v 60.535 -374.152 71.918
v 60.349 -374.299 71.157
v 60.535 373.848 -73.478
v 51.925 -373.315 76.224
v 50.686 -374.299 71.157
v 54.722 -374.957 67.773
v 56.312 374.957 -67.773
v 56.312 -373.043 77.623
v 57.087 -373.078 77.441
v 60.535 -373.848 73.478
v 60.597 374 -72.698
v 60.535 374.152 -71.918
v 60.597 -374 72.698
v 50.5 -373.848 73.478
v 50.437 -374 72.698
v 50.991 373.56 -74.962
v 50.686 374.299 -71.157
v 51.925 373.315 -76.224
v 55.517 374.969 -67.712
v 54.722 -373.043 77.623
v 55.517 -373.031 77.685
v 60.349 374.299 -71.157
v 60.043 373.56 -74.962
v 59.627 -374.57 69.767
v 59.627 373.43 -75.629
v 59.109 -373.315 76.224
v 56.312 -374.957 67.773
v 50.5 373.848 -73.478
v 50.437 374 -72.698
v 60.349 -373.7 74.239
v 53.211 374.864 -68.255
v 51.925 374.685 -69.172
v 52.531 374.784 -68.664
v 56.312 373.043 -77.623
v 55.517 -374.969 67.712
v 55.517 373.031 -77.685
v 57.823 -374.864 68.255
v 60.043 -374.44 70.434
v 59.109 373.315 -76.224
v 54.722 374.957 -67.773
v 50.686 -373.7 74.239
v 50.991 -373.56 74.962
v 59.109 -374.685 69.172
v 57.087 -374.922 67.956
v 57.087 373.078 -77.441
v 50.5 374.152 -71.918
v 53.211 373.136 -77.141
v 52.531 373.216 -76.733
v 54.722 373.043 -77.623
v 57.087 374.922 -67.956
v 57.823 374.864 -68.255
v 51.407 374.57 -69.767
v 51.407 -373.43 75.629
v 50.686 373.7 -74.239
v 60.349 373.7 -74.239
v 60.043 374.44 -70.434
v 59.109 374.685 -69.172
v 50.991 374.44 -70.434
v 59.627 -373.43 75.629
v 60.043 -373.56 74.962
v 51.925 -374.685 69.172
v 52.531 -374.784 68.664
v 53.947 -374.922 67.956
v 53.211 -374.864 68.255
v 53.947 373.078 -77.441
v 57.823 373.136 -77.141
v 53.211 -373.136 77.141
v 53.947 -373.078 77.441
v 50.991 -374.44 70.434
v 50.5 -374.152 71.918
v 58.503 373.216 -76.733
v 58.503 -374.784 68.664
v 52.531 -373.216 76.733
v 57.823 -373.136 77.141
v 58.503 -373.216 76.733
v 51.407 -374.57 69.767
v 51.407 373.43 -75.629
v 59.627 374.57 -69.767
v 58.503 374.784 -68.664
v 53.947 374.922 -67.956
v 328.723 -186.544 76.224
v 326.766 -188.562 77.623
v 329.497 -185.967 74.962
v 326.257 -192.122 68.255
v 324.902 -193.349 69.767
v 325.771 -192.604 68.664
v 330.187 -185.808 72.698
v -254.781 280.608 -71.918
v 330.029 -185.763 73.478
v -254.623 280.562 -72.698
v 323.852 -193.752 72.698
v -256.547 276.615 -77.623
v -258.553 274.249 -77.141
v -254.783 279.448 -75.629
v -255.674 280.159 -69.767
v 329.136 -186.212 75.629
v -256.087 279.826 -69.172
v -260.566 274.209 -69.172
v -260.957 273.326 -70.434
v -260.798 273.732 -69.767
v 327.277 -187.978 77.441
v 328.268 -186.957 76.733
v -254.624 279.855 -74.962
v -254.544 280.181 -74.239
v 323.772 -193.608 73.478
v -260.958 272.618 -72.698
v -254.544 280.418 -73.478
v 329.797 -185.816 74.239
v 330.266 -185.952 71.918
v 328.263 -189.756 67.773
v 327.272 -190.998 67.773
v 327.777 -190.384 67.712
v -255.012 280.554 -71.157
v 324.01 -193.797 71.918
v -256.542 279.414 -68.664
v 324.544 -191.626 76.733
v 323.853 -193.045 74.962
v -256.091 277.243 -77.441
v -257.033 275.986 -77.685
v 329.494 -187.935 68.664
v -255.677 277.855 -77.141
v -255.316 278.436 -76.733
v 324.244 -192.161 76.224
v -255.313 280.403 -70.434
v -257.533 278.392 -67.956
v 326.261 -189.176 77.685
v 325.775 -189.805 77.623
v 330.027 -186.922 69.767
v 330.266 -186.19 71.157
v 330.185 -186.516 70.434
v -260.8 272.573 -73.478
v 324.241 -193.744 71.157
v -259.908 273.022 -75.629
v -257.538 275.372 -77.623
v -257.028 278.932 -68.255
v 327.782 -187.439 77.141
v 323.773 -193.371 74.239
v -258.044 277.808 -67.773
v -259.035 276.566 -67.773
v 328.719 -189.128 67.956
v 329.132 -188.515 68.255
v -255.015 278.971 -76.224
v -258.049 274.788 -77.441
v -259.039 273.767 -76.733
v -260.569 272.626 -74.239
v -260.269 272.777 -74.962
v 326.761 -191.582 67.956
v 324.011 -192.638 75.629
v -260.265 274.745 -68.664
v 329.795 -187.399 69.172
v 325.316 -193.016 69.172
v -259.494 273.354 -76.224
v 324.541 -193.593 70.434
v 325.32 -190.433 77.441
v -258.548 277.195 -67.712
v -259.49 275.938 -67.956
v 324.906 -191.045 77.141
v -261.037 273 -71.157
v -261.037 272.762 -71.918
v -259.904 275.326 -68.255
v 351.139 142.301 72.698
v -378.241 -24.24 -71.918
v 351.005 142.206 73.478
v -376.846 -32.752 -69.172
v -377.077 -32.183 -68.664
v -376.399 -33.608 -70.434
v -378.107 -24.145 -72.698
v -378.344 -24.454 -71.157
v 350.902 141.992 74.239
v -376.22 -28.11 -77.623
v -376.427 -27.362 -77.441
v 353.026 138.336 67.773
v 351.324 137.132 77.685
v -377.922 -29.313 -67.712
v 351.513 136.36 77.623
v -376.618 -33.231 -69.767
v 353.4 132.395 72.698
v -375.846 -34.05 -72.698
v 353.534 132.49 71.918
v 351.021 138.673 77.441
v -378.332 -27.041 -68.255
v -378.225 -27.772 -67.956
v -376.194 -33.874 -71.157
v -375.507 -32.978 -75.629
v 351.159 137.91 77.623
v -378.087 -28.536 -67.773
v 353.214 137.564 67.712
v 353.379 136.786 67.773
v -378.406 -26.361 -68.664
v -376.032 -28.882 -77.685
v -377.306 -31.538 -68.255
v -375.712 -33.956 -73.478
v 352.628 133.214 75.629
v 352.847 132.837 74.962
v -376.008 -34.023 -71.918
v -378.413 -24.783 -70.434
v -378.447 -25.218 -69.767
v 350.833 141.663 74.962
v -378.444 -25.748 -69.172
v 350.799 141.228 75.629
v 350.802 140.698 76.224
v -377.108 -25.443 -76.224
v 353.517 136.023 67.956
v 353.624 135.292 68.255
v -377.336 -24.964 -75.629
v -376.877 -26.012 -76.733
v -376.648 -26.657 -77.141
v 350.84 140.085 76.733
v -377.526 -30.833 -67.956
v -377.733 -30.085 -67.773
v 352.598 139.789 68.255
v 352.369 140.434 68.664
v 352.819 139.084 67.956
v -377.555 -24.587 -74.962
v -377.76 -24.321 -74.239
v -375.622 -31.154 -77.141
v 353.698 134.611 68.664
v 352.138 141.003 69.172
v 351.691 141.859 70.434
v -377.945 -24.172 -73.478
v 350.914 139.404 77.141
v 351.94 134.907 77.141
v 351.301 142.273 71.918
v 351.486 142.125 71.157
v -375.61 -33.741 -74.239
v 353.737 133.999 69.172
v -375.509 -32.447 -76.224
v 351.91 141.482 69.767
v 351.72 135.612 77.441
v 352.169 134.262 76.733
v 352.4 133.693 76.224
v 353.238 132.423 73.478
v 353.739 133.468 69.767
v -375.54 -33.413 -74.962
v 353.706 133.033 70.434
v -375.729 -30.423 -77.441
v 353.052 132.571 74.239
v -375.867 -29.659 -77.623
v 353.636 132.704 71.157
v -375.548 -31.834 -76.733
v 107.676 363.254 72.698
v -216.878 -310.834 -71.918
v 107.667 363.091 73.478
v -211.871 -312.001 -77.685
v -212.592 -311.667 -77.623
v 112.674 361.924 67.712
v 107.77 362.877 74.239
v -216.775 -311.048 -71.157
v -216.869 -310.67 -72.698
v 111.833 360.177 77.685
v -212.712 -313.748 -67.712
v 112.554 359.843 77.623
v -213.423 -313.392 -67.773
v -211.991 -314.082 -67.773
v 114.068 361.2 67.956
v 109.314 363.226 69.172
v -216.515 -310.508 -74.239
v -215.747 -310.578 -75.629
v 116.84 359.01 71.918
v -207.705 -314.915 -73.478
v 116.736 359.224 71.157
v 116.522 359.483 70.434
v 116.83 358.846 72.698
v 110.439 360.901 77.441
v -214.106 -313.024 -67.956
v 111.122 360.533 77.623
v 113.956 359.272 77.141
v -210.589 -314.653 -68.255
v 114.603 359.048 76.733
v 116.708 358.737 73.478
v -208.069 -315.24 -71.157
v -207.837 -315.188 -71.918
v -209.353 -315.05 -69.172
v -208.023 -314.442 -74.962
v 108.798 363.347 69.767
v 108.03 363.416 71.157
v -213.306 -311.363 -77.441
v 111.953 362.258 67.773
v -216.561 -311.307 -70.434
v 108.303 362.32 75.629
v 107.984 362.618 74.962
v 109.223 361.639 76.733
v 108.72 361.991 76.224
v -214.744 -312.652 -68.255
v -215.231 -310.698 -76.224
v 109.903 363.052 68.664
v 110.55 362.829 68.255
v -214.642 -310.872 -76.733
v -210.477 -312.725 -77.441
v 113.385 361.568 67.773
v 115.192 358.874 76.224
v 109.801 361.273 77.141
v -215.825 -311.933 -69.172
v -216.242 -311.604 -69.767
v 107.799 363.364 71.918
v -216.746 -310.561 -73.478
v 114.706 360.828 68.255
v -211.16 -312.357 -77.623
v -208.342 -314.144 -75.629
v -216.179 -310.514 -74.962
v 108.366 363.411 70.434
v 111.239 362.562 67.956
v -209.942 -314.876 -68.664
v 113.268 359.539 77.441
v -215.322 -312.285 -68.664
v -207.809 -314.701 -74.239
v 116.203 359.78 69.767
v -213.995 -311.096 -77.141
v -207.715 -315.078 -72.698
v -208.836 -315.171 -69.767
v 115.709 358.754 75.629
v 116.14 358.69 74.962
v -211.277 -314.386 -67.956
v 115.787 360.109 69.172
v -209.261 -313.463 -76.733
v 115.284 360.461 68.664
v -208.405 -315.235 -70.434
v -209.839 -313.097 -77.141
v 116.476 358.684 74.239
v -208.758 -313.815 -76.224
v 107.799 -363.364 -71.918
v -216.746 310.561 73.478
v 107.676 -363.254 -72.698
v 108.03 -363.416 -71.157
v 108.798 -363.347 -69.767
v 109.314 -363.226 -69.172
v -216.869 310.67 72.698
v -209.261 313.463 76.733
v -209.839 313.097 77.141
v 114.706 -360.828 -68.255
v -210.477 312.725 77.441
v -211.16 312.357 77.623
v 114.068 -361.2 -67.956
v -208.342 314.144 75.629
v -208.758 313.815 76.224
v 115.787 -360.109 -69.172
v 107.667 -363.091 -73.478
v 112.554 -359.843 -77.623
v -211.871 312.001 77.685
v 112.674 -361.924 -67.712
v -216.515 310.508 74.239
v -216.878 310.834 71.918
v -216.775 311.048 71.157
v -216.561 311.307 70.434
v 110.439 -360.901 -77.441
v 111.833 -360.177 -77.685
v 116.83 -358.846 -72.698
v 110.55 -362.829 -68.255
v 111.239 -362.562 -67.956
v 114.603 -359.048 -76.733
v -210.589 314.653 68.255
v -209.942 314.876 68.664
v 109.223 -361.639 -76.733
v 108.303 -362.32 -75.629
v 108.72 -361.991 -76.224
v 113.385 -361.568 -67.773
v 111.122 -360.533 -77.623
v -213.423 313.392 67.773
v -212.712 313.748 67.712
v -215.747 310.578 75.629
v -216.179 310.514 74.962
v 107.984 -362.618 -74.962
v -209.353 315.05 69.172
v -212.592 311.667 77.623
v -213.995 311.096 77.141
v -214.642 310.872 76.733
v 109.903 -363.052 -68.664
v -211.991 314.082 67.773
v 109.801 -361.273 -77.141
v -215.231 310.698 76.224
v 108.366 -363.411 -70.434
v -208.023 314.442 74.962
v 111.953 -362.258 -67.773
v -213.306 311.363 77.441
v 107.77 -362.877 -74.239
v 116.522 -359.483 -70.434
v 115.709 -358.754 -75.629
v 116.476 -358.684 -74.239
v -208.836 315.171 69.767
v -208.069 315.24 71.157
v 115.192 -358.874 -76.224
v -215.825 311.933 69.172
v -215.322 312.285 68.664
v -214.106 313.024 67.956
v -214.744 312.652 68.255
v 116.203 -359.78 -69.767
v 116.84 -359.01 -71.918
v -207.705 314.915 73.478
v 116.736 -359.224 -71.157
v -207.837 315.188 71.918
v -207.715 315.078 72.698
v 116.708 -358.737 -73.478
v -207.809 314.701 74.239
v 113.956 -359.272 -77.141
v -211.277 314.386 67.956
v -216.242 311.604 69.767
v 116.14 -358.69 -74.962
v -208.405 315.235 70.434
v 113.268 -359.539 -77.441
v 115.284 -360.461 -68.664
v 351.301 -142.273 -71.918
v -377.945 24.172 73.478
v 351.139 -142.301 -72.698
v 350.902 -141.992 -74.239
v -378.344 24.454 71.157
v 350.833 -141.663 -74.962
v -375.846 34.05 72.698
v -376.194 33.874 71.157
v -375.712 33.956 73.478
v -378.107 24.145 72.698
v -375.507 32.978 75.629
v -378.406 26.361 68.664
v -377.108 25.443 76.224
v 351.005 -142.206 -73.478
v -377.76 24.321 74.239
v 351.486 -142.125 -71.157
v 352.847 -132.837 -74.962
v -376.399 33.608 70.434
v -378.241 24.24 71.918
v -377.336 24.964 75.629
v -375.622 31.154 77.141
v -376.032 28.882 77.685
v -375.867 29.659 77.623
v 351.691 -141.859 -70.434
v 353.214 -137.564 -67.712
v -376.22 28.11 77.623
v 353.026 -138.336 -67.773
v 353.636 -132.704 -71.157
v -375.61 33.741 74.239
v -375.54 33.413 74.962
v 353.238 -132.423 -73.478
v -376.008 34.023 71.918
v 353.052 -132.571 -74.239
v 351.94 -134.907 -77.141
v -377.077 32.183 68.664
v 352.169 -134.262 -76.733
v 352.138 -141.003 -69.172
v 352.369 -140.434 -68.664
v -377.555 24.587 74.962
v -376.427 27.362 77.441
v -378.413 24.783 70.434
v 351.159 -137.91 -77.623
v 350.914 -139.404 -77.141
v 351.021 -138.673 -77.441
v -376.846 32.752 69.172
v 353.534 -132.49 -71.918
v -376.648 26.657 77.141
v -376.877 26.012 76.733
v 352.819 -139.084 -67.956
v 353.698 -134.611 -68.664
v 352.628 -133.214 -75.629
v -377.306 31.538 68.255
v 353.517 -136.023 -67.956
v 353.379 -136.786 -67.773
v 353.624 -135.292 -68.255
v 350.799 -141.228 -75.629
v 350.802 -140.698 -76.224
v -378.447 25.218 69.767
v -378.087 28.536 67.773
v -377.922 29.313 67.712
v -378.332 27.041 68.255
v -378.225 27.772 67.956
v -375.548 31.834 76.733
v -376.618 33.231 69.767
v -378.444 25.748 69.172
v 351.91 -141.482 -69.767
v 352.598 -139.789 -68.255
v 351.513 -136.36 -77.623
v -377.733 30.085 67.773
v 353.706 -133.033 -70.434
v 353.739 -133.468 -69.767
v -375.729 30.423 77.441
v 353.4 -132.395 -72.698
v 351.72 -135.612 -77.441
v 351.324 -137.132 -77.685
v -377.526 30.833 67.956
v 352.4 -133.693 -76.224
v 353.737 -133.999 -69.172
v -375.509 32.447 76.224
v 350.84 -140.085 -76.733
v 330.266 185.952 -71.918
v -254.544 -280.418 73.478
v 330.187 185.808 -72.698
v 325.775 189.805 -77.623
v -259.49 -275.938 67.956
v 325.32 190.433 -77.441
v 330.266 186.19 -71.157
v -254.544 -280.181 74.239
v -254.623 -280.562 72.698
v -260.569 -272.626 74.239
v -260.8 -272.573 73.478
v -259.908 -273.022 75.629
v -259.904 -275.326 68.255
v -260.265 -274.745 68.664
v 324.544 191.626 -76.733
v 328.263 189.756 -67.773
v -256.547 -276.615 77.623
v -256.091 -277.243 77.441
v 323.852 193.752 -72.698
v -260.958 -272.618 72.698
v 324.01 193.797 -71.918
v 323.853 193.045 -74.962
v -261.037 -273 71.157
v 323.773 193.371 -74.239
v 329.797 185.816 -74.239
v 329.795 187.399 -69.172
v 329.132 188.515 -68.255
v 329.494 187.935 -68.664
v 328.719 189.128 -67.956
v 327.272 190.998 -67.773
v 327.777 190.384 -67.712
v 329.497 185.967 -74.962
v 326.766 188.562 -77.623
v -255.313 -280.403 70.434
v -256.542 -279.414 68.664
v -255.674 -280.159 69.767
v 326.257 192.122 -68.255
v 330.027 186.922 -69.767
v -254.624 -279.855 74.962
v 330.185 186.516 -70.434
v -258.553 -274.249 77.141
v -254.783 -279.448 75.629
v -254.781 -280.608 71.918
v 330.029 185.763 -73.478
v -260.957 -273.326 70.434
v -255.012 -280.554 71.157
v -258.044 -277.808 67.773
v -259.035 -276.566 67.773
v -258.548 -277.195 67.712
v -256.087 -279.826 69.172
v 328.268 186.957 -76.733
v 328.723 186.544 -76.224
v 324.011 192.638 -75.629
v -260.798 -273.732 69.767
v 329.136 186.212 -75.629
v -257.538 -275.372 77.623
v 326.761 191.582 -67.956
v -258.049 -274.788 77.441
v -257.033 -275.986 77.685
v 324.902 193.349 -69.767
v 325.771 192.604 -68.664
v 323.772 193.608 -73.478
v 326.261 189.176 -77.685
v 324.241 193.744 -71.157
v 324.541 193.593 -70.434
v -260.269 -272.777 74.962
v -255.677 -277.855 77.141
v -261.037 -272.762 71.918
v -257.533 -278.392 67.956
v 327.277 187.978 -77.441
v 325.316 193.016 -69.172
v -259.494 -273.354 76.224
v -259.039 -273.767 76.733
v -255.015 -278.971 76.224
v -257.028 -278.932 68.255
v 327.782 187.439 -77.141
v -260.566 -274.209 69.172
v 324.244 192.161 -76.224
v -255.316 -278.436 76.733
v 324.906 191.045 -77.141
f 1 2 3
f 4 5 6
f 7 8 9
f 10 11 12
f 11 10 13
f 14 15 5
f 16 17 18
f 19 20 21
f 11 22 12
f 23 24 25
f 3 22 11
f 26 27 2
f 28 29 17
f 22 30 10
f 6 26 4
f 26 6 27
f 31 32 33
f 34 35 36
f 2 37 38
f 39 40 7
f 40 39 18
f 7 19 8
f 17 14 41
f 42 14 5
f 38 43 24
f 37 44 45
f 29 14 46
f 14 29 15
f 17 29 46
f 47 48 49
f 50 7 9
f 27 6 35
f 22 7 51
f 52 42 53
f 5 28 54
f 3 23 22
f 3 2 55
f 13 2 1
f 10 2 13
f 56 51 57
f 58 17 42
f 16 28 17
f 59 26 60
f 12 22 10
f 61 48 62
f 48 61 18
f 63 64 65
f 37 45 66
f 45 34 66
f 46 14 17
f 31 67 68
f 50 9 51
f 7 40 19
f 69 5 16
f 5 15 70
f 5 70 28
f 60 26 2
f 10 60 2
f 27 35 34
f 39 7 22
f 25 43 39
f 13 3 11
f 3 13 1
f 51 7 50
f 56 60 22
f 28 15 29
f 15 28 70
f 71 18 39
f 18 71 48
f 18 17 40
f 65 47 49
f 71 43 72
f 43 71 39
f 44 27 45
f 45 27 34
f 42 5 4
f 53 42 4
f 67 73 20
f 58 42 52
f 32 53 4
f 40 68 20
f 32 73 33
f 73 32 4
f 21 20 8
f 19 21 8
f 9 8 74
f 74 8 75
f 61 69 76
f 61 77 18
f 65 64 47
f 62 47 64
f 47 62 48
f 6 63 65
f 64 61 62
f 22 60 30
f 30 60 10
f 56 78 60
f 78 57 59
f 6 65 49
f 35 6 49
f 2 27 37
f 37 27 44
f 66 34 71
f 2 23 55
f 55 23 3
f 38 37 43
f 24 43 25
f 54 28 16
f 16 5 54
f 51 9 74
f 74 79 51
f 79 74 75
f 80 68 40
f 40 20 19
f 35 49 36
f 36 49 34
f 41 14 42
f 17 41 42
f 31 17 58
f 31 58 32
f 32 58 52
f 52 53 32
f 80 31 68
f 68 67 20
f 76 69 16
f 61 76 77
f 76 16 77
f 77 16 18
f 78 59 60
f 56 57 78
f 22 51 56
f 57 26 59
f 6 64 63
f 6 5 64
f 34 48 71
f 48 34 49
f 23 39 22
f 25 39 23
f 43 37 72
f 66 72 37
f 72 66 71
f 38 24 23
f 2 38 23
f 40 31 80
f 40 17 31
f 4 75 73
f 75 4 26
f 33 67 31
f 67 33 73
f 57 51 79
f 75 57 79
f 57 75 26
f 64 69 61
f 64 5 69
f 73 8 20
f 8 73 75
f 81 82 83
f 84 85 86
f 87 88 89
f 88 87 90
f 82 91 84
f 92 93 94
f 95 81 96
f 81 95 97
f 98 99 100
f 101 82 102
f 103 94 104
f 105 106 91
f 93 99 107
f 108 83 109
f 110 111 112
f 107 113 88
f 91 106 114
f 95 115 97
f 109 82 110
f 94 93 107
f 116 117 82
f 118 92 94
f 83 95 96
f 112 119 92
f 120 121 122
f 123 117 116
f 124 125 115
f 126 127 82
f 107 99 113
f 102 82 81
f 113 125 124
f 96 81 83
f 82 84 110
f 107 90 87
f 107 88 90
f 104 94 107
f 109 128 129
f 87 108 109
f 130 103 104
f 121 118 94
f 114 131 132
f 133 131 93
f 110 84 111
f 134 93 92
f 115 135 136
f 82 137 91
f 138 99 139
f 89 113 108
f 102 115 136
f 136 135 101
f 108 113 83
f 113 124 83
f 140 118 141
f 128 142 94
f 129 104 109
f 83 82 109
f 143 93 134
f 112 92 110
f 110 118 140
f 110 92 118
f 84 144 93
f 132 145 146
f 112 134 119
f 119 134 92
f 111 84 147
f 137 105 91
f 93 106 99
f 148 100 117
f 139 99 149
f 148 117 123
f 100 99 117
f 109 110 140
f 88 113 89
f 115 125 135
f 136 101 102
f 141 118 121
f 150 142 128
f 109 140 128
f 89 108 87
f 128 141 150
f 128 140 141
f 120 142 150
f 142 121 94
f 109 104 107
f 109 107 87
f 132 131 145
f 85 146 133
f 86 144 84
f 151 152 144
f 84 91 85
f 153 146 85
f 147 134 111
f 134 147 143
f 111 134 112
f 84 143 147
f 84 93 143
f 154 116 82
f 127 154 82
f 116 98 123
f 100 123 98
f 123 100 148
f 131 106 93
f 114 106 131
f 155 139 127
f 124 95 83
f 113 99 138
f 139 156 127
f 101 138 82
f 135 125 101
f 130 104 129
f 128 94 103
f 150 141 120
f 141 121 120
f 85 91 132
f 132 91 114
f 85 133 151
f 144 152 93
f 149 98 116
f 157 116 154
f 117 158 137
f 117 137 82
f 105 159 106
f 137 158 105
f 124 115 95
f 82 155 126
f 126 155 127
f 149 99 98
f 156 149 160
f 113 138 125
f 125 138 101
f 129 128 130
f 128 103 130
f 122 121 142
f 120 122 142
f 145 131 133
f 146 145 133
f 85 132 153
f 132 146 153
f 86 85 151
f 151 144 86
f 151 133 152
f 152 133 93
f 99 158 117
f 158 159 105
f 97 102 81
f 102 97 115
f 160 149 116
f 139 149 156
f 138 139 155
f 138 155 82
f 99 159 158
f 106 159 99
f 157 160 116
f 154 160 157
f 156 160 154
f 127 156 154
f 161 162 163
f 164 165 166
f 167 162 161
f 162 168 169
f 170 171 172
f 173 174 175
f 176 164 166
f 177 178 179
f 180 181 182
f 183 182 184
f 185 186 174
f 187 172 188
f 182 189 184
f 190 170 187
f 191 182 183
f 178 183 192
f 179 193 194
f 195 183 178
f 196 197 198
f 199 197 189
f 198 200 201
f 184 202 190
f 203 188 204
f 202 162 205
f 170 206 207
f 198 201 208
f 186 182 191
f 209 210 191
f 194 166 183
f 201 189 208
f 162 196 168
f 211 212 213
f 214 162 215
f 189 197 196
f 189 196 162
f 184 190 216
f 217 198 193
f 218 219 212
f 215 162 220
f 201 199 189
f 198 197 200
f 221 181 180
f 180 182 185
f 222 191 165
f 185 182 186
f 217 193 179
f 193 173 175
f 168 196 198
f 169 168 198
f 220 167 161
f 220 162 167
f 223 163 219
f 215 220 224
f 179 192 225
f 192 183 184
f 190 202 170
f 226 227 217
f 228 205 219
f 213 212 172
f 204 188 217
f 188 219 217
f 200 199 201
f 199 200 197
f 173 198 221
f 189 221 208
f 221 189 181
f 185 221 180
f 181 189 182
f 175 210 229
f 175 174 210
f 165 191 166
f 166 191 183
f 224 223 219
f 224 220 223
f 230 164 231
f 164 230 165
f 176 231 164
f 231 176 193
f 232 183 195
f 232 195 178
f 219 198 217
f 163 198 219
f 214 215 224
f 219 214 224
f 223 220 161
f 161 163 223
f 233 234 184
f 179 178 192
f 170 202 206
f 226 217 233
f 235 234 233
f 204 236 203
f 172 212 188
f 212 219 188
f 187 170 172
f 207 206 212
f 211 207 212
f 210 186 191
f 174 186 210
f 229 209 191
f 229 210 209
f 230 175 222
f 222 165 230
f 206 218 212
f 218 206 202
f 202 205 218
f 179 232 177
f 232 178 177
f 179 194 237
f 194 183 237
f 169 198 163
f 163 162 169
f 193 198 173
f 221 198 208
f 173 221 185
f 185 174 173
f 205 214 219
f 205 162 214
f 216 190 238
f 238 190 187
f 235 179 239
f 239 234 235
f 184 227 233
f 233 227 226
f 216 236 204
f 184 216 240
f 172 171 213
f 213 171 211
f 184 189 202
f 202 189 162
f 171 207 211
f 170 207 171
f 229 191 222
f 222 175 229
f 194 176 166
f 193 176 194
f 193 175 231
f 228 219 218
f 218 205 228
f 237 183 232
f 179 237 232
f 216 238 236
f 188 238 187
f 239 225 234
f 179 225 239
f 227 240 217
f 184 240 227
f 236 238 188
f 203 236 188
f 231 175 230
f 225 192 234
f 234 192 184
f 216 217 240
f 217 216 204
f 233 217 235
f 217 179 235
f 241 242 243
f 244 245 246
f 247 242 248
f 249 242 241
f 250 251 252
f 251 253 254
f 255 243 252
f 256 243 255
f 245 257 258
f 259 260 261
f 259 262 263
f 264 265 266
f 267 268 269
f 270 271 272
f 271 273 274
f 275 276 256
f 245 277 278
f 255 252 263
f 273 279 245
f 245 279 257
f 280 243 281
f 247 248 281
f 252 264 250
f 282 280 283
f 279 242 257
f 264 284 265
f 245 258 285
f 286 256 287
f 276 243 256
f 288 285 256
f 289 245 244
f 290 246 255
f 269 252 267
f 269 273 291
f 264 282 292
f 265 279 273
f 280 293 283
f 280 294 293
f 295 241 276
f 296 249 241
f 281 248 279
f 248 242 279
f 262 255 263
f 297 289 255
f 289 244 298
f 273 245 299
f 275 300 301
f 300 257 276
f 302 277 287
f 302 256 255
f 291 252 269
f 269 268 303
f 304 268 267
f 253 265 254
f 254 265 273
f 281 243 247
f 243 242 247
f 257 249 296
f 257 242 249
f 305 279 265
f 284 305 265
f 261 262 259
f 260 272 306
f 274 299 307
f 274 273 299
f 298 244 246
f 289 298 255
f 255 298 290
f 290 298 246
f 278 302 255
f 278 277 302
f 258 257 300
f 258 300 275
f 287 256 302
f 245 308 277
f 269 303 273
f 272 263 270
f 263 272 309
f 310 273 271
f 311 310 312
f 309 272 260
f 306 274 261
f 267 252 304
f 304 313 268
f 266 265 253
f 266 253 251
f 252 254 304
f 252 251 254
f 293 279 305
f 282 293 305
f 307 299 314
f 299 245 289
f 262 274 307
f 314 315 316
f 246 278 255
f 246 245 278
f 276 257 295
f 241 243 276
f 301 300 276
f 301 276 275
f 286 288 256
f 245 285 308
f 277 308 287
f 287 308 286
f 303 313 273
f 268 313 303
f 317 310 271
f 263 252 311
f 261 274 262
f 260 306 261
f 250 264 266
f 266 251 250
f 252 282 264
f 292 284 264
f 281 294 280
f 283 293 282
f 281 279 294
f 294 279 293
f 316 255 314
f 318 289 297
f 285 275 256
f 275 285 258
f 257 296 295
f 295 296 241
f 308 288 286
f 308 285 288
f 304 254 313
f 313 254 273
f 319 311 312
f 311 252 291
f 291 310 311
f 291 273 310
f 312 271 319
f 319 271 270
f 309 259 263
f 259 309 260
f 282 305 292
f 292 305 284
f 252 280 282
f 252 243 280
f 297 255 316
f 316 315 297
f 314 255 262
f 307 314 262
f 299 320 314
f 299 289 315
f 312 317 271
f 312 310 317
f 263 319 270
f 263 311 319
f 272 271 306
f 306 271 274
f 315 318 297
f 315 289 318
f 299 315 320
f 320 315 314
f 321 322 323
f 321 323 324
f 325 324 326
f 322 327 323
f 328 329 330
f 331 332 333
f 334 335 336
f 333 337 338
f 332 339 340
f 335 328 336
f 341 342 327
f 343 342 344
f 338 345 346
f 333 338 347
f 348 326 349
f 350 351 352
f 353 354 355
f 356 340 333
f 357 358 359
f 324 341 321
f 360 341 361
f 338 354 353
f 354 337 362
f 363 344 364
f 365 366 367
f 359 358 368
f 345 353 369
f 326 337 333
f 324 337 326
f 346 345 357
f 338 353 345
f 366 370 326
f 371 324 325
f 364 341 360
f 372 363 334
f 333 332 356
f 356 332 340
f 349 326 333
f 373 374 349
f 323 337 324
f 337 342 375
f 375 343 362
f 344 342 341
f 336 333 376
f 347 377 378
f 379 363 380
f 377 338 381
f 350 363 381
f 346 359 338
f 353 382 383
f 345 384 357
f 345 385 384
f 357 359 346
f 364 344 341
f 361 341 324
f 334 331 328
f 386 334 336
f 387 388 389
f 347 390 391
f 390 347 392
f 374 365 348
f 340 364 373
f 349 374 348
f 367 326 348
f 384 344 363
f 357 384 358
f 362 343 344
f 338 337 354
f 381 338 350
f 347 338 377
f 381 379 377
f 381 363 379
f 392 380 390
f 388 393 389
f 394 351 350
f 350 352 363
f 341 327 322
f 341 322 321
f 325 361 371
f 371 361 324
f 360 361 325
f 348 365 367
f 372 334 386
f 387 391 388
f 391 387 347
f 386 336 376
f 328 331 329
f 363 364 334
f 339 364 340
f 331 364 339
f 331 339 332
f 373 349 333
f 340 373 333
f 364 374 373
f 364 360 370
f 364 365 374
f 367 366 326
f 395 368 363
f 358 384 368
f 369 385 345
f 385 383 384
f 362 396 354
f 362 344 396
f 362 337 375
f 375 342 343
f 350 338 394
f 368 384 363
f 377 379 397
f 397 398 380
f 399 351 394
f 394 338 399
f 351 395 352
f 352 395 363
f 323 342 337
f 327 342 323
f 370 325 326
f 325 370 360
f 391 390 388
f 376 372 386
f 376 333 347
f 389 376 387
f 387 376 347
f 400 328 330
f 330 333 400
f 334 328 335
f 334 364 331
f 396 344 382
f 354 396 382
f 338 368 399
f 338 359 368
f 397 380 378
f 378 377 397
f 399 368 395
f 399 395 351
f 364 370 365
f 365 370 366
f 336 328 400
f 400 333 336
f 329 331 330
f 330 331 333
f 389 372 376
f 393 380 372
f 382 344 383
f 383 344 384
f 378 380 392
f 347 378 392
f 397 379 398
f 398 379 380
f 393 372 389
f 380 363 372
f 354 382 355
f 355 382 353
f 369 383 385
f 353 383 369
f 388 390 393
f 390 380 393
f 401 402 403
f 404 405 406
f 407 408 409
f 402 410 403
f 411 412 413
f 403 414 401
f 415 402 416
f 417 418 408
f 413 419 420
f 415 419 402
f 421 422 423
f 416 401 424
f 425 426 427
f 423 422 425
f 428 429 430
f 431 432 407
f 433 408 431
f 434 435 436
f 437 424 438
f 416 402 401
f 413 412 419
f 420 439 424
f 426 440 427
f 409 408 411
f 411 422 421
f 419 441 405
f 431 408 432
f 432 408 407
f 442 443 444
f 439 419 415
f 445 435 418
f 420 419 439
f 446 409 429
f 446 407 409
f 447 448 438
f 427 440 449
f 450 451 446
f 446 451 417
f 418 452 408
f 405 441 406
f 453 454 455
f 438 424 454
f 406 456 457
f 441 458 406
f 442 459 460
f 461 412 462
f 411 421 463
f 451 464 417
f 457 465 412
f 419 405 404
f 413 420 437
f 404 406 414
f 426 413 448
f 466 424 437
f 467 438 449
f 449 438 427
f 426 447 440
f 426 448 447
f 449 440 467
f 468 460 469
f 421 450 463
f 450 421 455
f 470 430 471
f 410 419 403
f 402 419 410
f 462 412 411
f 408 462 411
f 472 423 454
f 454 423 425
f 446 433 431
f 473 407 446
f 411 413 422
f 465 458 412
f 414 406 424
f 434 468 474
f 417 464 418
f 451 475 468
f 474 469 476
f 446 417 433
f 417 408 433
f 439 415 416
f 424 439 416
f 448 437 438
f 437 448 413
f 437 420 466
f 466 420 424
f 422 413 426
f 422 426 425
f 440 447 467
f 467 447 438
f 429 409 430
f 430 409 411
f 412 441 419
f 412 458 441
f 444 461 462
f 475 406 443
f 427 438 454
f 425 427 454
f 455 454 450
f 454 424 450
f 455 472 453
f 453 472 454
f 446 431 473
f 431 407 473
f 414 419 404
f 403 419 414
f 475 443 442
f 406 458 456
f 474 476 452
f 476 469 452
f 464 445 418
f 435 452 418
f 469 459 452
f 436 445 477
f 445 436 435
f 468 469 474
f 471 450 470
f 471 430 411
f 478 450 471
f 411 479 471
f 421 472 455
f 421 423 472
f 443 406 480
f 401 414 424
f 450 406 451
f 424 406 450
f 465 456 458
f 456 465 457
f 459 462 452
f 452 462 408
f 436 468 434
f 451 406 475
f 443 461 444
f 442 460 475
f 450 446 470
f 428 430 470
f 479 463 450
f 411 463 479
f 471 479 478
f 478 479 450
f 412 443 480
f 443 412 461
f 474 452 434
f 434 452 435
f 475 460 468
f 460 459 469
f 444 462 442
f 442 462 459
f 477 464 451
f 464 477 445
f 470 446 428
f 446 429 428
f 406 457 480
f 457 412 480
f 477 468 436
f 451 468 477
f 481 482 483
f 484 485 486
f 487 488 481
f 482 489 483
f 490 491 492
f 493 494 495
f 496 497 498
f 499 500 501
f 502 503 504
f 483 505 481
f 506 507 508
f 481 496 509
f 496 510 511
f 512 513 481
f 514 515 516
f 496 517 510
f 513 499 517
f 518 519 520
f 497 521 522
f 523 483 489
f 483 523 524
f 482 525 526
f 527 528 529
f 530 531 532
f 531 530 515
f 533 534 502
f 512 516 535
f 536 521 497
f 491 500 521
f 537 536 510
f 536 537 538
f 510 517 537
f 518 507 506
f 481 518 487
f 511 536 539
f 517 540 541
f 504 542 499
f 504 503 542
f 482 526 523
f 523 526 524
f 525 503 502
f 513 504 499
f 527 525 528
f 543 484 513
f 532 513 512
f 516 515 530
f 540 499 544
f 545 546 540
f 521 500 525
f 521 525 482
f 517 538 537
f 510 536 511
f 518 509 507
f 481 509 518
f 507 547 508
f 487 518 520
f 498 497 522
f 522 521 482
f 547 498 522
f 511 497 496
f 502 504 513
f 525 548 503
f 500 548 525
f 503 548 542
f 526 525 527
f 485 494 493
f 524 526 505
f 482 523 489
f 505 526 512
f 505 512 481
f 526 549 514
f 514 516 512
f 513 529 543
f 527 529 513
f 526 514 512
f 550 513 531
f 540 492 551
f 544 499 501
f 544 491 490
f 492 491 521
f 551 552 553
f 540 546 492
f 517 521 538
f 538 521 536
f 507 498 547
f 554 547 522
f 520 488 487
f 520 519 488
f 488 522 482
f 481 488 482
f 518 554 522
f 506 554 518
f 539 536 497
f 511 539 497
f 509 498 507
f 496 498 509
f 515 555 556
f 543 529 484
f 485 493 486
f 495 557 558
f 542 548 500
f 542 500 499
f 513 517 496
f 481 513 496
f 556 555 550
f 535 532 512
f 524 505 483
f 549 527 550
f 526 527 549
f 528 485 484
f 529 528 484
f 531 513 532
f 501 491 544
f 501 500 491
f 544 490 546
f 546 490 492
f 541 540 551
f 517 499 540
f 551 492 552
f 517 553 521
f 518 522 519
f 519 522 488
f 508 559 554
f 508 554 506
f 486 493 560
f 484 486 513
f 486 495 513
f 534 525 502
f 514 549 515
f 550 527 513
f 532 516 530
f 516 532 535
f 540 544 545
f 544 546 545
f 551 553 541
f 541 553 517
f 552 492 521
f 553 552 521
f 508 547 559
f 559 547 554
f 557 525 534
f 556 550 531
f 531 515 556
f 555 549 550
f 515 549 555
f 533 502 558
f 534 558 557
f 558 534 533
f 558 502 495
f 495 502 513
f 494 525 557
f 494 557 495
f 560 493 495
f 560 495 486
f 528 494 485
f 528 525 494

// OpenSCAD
$fn=40;
theta=79;
dheta=90-theta;
N=7;
beta=180*(N-2)/N-90;
echo(beta);
//alpha=atan(((1+sin(beta))*(sin(dheta)*cos(dheta)))/(cos(beta)*cos(dheta)));

alpha=atan(((1-sin(beta))*(sin(dheta)))/(cos(beta)));
echo("alpha",alpha);
w=atan((sin(beta)*pow(cos(dheta),2)+pow(sin(dheta),2))/(cos(beta)*cos(dheta)));
echo("w",w); //I have these projection angles right


inch=25.4;
minir=1/5*inch;
echo("r*2",minir*2);

k=2*minir/cos(alpha);
echo("k",k);

L=2*minir*sin(alpha);
echo("L",L);

m=L/cos(alpha);
echo("m",m);

d=tan(w)*L;
echo("d",d);

p=sqrt(pow((d),2)+pow(m,2));

h=sqrt(pow((d+p),2)+pow(k,2));
echo("h",h);

miniD=h/2/tan(dheta);
echo("miniD",miniD);

miniDistance=miniD*tan((90+beta)/2);
echo(miniDistance);


miniJ=pow(1/cos(90-theta),2)*minir*2;
miniSize=1*inch;
miniR=minir/cos(90-theta);
miniMagic=atan((miniR/minir)*tan(theta));
miniRPrime=sin(miniMagic)*miniR;
miniTemp=cos(miniMagic)*minir; //incomprehensible squishy garbage... https://www.uwgb.edu/DutchS/STRUCTGE/MOHR004.HTM
miniGap=tan(90-theta)*miniTemp;
miniHeight=2*miniRPrime+2*miniGap; //It works perfectly.
//miniDistance=miniHeight/2/tan(90-theta);


module miniJunction(n){
    /*difference(){
        union(){
            for (i=[0:n]){
            rotate([0,0,360/n*i])translate([miniDistance,0,0])rotate([theta,0,0])cylinder(h=miniSize,r=miniR,center=true);
        }
        cube([miniDistance*2,miniDistance*2,miniHeight/2],center=true);
        }*/
        for (i=[0:n]){
            rotate([0,0,360/n*i])translate([miniDistance,0,0])rotate([(theta),0,0])cylinder(h=miniSize*30,r=minir,center=true);
        
        }
    //}
}

rotate([0,w,0]);//rotate([0,0,alpha]);
translate([-miniDistance,0,0])rotate([-theta,0,0]);miniJunction(N);
